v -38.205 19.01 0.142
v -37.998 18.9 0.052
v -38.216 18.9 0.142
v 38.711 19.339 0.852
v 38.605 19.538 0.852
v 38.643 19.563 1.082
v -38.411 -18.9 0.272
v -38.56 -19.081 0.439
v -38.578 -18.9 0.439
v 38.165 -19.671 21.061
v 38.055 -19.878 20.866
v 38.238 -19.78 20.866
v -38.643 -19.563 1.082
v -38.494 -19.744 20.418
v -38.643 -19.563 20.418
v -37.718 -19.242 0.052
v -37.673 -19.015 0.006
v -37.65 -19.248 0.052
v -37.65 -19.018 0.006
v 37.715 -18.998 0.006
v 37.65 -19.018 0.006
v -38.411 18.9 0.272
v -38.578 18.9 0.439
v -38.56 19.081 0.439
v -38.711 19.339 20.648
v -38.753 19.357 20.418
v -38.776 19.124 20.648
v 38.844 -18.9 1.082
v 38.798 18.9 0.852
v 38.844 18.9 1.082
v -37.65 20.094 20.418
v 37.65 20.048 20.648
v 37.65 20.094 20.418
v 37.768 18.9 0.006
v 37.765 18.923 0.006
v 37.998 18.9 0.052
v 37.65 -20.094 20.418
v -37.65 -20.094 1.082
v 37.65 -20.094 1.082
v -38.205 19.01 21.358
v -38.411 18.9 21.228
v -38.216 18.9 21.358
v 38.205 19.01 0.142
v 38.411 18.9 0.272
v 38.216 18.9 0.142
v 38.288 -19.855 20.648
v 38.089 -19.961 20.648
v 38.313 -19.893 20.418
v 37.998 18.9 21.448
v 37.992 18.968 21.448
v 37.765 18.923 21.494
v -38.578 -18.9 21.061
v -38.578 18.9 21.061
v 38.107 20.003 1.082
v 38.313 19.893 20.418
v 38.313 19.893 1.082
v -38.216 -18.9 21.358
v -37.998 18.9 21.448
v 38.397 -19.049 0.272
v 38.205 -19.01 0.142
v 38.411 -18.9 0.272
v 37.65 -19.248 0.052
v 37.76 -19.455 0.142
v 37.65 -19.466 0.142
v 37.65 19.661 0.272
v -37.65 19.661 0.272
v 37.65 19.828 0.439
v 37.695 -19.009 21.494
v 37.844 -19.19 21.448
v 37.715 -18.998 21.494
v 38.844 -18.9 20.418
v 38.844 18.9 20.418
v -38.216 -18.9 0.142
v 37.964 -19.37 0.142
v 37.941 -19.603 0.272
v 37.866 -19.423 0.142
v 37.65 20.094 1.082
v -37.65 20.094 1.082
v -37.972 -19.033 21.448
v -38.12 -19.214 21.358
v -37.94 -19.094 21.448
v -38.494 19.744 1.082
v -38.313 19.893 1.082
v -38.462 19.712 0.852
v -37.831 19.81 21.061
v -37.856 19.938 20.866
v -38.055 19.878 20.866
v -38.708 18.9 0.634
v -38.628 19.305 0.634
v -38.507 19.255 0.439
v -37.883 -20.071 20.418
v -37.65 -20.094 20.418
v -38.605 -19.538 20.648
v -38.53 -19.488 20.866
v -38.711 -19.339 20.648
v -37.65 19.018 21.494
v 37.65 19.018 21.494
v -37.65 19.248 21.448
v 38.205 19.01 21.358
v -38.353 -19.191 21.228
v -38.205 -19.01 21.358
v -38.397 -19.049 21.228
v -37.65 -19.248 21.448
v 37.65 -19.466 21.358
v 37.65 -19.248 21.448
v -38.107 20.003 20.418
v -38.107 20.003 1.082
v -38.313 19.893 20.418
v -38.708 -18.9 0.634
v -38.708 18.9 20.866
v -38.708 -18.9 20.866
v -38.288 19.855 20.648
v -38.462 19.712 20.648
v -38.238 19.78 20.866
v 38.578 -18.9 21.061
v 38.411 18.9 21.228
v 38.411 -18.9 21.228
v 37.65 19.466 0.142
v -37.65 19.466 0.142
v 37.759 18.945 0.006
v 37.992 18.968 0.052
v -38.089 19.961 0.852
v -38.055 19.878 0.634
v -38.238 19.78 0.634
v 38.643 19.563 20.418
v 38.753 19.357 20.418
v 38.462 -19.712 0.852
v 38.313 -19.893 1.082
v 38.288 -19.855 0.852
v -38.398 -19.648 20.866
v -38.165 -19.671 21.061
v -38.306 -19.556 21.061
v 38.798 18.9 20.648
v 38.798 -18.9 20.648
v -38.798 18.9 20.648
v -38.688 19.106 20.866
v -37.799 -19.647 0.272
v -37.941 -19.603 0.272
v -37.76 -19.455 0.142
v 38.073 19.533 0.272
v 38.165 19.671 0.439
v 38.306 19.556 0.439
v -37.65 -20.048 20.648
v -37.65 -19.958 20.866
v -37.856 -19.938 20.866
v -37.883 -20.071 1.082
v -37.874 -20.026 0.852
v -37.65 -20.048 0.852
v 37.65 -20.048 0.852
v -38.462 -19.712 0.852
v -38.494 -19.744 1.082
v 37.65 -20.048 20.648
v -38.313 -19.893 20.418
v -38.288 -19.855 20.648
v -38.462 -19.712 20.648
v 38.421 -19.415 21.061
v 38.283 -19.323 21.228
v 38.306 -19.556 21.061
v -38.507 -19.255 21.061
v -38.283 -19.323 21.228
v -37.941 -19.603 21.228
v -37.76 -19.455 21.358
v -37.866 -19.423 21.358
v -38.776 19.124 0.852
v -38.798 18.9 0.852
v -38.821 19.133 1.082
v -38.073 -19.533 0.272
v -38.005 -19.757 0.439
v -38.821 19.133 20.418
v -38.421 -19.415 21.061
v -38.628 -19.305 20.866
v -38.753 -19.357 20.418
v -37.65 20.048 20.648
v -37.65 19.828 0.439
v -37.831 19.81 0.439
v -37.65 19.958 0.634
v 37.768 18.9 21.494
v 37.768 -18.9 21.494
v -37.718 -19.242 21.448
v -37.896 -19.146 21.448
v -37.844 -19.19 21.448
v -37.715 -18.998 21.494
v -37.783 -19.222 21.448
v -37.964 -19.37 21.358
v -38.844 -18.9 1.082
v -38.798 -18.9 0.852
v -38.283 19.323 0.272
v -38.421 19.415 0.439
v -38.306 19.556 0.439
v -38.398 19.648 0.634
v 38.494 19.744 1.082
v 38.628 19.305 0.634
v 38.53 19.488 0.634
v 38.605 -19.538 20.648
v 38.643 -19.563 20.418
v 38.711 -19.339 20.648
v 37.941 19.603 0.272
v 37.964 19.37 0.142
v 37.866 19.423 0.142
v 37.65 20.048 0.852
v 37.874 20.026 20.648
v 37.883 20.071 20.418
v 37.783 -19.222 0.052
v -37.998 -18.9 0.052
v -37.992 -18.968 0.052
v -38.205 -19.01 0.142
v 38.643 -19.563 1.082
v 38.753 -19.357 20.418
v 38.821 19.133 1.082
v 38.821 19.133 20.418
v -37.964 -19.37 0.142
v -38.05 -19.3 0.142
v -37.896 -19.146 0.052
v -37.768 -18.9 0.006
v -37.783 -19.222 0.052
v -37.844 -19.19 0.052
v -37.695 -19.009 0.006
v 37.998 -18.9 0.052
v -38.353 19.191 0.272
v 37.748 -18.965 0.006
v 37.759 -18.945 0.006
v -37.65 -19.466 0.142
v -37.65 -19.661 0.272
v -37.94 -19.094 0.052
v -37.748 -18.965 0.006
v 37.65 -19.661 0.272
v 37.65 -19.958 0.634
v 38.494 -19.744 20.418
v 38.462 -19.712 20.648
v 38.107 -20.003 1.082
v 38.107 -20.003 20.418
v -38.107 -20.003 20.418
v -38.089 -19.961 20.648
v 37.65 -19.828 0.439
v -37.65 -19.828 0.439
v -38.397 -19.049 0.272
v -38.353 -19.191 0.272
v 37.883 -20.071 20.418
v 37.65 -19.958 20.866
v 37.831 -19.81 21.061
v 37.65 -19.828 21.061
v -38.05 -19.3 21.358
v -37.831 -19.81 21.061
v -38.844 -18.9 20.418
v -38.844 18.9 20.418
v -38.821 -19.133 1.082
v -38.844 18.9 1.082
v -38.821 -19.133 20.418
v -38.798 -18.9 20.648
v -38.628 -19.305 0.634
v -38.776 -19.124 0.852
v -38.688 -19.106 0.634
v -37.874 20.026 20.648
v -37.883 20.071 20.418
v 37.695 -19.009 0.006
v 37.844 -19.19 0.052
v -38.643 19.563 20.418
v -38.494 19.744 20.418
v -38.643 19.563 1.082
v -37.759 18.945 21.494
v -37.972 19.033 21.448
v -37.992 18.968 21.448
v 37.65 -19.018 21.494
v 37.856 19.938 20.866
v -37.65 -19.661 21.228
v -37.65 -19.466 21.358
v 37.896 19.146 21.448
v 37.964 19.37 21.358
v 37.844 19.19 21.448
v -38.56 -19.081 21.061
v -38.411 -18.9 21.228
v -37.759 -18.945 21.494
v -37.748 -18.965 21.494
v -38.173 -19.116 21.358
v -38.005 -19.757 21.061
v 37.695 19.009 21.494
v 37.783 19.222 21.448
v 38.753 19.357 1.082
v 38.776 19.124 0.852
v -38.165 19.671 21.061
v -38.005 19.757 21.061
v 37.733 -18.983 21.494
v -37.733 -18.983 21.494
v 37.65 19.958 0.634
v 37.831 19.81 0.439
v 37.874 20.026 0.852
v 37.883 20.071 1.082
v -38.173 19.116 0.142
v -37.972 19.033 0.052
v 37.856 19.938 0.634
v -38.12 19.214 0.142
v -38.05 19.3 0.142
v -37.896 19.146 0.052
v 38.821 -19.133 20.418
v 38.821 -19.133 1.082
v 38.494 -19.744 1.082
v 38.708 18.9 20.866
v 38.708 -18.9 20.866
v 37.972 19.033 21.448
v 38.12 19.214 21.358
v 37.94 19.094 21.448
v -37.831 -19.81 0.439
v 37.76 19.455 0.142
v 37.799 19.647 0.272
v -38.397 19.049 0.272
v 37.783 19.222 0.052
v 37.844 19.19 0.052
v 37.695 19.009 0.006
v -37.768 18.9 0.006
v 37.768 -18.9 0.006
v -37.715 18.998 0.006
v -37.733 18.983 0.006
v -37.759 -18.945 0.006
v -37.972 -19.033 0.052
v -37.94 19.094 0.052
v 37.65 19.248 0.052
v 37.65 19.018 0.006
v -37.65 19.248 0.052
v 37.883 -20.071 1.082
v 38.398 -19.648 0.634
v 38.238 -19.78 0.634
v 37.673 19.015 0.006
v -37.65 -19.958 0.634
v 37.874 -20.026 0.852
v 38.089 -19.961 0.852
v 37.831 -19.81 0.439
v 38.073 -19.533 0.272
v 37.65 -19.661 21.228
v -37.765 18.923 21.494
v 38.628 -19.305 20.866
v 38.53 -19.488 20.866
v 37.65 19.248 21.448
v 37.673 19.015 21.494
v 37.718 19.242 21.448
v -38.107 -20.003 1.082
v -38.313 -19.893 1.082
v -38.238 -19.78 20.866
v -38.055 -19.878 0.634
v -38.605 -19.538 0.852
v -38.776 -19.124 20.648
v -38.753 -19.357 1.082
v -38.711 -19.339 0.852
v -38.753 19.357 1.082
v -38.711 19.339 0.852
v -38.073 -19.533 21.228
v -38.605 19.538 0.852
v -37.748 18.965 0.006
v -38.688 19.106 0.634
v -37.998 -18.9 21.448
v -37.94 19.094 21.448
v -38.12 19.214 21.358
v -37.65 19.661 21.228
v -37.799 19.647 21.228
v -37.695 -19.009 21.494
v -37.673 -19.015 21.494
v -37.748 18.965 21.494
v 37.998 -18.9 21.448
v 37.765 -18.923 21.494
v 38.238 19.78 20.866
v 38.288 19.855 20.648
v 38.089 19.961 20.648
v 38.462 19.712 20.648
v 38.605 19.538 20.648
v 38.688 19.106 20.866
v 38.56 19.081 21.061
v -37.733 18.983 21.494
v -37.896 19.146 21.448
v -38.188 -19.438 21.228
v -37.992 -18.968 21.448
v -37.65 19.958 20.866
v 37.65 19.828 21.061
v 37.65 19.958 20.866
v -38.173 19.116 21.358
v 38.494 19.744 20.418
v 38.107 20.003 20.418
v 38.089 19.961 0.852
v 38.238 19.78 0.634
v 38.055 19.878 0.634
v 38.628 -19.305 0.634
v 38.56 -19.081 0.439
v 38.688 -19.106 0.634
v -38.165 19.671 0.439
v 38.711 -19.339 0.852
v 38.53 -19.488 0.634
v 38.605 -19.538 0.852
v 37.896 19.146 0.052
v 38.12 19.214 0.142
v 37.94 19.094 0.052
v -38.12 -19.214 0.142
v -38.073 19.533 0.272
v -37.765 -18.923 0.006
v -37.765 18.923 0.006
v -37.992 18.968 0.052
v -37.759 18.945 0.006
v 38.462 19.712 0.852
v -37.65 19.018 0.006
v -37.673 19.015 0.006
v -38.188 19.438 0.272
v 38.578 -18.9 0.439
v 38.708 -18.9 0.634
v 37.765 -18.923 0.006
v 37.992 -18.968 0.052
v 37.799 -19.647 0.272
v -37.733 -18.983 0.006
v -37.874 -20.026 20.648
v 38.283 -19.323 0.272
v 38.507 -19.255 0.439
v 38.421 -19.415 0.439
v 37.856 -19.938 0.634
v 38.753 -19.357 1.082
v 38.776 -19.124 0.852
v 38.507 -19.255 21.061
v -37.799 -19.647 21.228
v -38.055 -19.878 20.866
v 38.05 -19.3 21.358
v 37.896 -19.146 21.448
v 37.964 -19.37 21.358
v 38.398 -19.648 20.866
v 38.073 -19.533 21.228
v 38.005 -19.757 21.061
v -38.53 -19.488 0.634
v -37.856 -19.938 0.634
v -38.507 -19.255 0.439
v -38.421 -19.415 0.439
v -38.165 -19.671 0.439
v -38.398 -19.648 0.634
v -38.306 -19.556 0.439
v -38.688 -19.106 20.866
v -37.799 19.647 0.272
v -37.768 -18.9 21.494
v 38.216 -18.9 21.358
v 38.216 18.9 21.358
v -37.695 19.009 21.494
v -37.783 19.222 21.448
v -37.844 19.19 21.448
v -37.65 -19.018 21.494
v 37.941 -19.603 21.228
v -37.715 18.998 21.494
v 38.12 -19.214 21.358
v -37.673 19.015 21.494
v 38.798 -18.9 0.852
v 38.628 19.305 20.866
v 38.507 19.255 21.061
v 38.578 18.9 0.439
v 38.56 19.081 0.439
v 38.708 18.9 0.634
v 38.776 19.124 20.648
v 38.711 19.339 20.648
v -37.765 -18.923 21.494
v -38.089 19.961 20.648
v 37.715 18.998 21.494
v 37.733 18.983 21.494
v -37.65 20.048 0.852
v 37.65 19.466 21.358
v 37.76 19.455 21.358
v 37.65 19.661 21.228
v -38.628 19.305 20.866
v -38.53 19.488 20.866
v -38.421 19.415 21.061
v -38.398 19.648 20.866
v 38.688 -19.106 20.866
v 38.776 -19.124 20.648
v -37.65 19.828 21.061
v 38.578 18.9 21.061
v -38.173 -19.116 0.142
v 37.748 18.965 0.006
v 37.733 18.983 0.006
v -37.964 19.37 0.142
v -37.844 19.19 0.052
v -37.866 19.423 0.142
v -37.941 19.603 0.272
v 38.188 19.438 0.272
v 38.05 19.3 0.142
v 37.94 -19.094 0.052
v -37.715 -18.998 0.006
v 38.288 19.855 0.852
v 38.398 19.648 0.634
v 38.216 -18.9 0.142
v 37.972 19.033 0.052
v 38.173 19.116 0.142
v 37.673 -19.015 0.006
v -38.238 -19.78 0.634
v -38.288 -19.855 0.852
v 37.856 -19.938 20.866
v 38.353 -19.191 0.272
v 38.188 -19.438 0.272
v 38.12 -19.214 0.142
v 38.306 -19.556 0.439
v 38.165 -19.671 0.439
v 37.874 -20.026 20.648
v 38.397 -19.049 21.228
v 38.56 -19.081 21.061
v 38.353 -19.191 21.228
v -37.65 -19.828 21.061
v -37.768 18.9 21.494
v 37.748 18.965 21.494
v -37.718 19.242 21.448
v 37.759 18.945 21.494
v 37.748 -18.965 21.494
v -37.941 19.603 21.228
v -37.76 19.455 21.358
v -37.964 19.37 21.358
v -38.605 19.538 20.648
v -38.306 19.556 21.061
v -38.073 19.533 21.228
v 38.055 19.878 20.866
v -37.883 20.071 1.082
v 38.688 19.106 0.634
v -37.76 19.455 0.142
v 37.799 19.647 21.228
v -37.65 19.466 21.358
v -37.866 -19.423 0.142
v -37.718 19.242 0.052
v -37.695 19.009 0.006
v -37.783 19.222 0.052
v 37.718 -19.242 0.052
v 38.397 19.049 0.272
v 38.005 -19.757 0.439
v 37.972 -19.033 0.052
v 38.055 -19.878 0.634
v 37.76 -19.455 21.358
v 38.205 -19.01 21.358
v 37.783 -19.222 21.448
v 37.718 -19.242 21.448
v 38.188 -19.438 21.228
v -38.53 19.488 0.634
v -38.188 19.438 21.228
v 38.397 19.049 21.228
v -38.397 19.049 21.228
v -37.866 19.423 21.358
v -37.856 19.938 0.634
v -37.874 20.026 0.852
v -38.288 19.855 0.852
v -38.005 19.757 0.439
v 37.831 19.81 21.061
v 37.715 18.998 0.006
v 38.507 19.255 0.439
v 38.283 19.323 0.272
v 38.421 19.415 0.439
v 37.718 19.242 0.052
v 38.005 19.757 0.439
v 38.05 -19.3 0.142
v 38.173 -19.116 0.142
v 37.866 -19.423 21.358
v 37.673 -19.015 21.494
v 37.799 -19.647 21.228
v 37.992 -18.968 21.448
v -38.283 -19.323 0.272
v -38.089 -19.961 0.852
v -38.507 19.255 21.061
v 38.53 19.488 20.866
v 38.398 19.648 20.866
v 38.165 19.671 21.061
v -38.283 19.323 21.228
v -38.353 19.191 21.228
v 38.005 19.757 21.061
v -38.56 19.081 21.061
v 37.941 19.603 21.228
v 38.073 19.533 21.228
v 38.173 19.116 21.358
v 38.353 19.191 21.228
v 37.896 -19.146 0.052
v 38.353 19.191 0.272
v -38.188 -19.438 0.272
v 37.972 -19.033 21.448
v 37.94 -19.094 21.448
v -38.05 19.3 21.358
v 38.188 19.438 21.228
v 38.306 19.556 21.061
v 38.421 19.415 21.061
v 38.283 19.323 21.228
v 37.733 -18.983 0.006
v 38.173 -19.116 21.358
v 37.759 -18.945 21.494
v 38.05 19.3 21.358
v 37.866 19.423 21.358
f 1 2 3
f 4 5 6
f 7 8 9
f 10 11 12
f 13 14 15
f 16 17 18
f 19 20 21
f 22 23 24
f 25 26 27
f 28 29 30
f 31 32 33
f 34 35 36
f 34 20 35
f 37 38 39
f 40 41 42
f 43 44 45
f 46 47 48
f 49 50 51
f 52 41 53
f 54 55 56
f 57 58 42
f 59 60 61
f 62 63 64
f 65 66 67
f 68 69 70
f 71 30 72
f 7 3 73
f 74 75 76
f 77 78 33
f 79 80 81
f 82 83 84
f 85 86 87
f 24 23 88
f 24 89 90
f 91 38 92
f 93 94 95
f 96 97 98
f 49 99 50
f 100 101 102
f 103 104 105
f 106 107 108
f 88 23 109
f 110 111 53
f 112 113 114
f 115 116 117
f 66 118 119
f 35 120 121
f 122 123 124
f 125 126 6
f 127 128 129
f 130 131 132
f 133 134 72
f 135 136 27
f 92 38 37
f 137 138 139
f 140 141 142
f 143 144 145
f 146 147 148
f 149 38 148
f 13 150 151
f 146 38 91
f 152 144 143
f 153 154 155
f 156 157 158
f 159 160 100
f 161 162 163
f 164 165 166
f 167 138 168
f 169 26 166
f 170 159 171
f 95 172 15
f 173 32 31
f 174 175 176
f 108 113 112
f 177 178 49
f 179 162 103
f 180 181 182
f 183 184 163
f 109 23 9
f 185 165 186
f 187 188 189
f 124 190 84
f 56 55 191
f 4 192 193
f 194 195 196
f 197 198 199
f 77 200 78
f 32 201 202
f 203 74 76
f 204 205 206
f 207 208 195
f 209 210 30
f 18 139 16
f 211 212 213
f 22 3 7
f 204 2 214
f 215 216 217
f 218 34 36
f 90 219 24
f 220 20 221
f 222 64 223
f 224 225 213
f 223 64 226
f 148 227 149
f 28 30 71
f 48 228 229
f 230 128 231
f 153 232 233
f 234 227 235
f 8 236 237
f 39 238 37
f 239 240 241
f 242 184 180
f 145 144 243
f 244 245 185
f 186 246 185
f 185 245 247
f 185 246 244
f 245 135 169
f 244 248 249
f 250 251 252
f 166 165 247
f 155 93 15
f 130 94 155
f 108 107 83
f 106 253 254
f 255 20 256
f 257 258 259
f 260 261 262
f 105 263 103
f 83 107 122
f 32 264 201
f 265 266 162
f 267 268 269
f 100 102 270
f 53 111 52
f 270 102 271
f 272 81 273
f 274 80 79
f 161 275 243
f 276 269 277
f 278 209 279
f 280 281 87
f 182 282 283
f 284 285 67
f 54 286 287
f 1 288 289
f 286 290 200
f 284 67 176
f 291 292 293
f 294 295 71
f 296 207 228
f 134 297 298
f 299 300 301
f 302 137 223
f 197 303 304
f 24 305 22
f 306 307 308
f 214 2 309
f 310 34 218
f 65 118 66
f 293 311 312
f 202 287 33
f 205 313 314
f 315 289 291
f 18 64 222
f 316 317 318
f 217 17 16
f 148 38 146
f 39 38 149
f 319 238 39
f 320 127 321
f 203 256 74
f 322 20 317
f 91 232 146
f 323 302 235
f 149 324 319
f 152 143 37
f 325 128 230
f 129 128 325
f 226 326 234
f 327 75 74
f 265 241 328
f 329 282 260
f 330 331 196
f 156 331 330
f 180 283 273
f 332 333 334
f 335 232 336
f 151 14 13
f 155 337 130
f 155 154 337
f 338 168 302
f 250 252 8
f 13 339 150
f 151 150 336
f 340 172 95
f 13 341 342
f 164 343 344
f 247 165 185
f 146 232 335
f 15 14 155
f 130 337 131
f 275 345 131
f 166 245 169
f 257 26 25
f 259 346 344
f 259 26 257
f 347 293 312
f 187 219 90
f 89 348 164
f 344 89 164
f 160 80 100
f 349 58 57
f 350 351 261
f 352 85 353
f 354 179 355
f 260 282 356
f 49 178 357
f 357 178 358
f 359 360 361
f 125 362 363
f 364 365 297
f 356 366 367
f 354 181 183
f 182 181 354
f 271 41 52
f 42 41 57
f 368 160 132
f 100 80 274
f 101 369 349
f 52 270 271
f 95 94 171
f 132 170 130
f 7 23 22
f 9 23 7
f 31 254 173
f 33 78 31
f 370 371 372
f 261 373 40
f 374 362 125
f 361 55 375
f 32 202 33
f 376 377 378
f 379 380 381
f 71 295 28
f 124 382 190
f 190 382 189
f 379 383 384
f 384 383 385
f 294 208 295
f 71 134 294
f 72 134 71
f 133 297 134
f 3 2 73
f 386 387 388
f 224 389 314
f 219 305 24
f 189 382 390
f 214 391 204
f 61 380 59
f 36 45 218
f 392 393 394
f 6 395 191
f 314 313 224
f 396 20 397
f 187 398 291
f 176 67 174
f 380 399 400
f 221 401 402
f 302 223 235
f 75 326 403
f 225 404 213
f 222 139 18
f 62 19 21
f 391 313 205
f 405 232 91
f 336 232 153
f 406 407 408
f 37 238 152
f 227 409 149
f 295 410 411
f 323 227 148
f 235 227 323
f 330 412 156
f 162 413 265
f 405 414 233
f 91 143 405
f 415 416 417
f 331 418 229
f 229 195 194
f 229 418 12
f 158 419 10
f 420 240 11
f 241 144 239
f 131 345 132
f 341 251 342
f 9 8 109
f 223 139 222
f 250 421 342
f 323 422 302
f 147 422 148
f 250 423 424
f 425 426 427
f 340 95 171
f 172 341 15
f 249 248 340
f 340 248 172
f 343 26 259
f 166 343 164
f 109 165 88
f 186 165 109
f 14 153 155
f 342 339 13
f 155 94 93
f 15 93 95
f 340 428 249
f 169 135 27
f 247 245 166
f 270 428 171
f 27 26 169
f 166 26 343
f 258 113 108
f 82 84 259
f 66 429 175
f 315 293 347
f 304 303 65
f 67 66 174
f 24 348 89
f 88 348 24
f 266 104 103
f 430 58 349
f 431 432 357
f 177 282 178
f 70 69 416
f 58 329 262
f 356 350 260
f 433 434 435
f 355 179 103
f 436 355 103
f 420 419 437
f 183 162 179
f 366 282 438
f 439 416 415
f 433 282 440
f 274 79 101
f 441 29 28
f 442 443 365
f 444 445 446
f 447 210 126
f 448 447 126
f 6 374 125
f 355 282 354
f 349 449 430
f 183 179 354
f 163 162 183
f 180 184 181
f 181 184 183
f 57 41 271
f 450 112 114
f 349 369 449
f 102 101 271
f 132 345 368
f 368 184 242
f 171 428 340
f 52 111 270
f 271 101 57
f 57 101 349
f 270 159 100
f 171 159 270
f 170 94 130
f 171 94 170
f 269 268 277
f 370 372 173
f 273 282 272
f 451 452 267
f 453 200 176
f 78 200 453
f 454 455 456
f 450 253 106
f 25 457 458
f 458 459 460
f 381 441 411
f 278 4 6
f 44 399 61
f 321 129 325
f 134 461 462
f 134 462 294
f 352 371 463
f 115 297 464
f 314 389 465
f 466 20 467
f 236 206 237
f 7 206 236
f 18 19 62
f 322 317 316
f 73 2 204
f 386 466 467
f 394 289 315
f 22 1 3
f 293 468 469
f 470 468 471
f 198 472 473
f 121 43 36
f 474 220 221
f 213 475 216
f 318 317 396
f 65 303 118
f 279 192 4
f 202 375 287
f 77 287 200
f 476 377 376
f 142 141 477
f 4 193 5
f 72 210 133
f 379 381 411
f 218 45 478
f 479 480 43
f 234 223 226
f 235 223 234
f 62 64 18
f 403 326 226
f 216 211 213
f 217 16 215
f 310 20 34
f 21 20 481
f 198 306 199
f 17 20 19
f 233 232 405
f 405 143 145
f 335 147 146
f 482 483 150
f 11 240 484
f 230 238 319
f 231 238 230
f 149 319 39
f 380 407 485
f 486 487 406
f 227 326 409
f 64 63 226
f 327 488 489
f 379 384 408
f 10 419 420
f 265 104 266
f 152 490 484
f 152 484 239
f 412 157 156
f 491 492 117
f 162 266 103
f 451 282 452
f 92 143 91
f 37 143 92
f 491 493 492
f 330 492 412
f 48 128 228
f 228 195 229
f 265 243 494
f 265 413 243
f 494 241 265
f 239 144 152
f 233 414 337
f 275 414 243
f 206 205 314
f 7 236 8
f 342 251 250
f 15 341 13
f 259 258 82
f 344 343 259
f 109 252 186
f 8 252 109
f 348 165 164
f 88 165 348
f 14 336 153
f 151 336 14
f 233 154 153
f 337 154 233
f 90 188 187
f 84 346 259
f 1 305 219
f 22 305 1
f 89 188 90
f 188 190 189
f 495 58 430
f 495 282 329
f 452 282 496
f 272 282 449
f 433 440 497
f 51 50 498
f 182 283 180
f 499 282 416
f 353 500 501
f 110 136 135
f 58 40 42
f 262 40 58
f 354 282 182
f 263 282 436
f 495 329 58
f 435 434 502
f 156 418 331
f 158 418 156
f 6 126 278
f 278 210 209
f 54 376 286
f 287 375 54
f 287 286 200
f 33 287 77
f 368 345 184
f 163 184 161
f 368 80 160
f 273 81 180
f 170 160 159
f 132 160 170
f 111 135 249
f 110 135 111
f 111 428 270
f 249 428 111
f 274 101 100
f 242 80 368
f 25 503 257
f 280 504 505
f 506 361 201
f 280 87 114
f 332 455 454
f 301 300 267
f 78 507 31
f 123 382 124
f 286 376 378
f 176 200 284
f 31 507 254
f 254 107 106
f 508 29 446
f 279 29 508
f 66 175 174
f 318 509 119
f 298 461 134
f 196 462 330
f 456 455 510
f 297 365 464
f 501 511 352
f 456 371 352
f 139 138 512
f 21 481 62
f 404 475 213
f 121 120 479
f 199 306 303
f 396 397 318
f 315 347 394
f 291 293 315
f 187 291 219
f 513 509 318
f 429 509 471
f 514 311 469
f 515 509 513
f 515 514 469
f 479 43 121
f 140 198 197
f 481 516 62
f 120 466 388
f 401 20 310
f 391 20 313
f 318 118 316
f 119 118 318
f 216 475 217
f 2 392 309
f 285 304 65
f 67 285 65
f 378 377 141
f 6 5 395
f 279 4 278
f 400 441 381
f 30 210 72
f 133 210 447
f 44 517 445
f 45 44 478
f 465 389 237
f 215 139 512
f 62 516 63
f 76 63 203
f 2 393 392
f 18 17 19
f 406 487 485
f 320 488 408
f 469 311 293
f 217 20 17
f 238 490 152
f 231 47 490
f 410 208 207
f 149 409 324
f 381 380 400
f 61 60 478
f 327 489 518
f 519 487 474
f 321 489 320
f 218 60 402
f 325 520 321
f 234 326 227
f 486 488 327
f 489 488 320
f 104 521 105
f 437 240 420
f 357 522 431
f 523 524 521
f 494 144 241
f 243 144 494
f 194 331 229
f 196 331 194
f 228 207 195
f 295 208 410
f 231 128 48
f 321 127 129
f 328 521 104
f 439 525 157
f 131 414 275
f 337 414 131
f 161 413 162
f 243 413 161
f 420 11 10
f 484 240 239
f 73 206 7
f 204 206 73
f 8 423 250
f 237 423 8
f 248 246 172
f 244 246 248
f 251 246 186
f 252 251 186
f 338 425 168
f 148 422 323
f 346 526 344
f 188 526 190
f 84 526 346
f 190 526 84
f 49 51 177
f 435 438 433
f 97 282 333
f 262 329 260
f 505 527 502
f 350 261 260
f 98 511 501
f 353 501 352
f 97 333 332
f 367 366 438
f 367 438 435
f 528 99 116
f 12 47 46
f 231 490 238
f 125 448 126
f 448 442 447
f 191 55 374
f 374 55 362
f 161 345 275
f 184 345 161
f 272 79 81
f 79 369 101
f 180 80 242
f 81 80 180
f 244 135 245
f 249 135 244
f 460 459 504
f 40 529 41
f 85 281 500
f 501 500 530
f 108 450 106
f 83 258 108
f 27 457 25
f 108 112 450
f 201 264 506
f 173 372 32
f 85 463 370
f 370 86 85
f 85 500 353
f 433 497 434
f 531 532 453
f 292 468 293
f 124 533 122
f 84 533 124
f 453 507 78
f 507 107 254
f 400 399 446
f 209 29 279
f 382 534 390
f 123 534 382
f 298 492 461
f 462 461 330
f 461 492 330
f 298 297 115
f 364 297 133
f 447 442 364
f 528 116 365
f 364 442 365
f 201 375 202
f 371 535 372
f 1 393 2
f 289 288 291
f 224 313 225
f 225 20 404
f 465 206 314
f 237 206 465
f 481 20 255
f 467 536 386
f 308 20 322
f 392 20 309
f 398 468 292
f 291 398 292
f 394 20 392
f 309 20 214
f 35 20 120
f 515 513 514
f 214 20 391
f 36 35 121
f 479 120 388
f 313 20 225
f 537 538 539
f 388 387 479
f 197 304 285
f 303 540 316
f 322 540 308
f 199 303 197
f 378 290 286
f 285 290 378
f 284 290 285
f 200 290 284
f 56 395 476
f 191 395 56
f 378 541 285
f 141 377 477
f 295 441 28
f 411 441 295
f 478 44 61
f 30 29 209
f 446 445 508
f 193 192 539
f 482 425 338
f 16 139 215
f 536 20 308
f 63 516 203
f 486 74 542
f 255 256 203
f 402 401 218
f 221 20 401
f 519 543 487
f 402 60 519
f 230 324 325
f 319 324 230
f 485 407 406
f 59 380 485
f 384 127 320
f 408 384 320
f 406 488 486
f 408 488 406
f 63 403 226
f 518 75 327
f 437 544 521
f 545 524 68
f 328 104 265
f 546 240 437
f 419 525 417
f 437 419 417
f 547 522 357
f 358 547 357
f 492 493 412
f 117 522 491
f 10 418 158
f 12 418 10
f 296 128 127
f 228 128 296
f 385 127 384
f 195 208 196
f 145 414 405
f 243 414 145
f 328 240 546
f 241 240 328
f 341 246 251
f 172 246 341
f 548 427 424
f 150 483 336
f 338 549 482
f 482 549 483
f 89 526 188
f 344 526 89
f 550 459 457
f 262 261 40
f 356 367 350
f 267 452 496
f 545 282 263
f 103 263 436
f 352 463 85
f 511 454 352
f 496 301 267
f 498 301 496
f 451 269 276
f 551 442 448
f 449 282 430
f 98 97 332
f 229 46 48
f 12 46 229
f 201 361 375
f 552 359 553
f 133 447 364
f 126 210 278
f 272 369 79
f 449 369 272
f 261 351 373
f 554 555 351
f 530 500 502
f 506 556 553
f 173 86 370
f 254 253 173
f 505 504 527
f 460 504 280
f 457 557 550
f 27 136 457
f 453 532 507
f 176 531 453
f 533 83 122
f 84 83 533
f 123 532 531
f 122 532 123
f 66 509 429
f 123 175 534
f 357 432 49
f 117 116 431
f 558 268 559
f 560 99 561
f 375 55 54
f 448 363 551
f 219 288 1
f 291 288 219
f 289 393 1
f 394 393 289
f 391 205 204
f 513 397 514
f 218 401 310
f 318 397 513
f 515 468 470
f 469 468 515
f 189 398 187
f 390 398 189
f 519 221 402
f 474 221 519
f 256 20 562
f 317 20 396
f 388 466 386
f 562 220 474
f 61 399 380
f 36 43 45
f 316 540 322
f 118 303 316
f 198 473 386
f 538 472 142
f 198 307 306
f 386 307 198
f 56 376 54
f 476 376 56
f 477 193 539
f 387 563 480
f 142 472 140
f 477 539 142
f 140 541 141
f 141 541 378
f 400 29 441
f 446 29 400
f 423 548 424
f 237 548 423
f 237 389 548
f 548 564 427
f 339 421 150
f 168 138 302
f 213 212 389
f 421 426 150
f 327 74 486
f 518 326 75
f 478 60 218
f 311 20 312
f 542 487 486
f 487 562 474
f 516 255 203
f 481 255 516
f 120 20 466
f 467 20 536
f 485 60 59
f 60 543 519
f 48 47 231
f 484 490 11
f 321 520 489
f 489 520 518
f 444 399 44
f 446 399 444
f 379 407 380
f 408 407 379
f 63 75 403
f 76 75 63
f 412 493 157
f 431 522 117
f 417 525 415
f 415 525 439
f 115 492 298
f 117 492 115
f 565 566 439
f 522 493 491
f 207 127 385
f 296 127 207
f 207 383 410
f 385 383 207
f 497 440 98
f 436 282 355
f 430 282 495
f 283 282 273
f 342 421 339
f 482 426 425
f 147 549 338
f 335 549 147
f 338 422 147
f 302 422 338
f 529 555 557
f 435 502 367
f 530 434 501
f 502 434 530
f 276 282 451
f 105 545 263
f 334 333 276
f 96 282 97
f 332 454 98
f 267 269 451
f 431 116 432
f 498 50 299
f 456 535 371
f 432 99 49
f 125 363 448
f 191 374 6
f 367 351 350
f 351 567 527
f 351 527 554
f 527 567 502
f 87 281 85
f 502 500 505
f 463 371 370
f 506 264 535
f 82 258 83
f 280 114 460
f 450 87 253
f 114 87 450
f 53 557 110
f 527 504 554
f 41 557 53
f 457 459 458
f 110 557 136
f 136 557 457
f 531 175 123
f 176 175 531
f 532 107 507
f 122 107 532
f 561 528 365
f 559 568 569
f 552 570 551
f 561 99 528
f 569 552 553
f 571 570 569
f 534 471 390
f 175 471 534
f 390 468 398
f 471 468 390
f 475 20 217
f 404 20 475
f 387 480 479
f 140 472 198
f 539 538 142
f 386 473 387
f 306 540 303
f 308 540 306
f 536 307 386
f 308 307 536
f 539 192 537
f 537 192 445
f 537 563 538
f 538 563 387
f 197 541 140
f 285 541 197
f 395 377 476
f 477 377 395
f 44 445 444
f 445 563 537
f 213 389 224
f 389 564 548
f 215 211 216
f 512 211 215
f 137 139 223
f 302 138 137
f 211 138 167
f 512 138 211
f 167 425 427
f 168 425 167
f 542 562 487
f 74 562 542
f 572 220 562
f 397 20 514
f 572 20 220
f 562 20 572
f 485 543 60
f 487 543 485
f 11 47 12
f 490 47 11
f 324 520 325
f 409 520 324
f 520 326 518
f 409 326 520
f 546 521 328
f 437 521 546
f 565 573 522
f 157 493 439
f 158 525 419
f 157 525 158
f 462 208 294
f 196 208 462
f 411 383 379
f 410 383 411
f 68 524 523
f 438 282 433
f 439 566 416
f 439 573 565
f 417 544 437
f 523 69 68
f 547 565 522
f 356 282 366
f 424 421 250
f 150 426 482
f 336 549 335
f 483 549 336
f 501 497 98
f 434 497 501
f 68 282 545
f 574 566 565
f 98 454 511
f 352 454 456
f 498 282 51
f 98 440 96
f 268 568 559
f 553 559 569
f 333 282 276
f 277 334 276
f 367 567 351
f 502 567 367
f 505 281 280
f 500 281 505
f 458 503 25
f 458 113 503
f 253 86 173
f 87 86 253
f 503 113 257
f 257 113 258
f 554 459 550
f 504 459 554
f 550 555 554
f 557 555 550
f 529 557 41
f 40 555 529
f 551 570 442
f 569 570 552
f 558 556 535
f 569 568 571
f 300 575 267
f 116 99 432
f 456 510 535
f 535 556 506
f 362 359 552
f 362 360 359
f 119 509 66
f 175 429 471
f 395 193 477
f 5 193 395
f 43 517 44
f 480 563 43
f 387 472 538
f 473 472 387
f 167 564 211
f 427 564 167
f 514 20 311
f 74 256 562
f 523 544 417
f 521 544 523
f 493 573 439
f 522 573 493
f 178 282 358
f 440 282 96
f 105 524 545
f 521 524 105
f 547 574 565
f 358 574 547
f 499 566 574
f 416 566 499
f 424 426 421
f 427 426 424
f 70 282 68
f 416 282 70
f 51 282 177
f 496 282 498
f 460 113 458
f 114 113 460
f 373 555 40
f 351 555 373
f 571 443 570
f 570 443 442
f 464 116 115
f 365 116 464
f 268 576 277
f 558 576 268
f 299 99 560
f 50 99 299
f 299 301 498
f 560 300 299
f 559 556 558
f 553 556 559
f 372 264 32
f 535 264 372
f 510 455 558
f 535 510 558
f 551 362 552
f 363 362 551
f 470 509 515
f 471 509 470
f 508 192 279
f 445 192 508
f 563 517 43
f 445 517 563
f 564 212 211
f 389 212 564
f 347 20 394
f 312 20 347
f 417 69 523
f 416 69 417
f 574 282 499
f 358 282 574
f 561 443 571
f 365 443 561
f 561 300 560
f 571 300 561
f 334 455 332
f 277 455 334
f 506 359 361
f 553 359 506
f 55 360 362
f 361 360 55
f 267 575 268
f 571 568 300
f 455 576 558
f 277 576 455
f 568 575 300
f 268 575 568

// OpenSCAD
// 18650×2 Holder (18650 雙節電池盒) visual source for NexCAD.
// Units: millimeters. Origin: part bottom-center, matching src/parts/library.ts.
// This generated baseline is intentionally simple; refine it with measured details before exporting STL.

$fn = 32;

module rounded_box(size, r = 0.8) {
  hull() {
    for (x = [-size[0] / 2 + r, size[0] / 2 - r])
      for (y = [-size[1] / 2 + r, size[1] / 2 - r]) {
        translate([x, y, r]) sphere(r = r);
        translate([x, y, size[2] - r]) sphere(r = r);
      }
  }
}

color("#2e7d5b") rounded_box([77.7, 40.2, 21.5], min(1.2, min(77.7, 40.2) / 8));
